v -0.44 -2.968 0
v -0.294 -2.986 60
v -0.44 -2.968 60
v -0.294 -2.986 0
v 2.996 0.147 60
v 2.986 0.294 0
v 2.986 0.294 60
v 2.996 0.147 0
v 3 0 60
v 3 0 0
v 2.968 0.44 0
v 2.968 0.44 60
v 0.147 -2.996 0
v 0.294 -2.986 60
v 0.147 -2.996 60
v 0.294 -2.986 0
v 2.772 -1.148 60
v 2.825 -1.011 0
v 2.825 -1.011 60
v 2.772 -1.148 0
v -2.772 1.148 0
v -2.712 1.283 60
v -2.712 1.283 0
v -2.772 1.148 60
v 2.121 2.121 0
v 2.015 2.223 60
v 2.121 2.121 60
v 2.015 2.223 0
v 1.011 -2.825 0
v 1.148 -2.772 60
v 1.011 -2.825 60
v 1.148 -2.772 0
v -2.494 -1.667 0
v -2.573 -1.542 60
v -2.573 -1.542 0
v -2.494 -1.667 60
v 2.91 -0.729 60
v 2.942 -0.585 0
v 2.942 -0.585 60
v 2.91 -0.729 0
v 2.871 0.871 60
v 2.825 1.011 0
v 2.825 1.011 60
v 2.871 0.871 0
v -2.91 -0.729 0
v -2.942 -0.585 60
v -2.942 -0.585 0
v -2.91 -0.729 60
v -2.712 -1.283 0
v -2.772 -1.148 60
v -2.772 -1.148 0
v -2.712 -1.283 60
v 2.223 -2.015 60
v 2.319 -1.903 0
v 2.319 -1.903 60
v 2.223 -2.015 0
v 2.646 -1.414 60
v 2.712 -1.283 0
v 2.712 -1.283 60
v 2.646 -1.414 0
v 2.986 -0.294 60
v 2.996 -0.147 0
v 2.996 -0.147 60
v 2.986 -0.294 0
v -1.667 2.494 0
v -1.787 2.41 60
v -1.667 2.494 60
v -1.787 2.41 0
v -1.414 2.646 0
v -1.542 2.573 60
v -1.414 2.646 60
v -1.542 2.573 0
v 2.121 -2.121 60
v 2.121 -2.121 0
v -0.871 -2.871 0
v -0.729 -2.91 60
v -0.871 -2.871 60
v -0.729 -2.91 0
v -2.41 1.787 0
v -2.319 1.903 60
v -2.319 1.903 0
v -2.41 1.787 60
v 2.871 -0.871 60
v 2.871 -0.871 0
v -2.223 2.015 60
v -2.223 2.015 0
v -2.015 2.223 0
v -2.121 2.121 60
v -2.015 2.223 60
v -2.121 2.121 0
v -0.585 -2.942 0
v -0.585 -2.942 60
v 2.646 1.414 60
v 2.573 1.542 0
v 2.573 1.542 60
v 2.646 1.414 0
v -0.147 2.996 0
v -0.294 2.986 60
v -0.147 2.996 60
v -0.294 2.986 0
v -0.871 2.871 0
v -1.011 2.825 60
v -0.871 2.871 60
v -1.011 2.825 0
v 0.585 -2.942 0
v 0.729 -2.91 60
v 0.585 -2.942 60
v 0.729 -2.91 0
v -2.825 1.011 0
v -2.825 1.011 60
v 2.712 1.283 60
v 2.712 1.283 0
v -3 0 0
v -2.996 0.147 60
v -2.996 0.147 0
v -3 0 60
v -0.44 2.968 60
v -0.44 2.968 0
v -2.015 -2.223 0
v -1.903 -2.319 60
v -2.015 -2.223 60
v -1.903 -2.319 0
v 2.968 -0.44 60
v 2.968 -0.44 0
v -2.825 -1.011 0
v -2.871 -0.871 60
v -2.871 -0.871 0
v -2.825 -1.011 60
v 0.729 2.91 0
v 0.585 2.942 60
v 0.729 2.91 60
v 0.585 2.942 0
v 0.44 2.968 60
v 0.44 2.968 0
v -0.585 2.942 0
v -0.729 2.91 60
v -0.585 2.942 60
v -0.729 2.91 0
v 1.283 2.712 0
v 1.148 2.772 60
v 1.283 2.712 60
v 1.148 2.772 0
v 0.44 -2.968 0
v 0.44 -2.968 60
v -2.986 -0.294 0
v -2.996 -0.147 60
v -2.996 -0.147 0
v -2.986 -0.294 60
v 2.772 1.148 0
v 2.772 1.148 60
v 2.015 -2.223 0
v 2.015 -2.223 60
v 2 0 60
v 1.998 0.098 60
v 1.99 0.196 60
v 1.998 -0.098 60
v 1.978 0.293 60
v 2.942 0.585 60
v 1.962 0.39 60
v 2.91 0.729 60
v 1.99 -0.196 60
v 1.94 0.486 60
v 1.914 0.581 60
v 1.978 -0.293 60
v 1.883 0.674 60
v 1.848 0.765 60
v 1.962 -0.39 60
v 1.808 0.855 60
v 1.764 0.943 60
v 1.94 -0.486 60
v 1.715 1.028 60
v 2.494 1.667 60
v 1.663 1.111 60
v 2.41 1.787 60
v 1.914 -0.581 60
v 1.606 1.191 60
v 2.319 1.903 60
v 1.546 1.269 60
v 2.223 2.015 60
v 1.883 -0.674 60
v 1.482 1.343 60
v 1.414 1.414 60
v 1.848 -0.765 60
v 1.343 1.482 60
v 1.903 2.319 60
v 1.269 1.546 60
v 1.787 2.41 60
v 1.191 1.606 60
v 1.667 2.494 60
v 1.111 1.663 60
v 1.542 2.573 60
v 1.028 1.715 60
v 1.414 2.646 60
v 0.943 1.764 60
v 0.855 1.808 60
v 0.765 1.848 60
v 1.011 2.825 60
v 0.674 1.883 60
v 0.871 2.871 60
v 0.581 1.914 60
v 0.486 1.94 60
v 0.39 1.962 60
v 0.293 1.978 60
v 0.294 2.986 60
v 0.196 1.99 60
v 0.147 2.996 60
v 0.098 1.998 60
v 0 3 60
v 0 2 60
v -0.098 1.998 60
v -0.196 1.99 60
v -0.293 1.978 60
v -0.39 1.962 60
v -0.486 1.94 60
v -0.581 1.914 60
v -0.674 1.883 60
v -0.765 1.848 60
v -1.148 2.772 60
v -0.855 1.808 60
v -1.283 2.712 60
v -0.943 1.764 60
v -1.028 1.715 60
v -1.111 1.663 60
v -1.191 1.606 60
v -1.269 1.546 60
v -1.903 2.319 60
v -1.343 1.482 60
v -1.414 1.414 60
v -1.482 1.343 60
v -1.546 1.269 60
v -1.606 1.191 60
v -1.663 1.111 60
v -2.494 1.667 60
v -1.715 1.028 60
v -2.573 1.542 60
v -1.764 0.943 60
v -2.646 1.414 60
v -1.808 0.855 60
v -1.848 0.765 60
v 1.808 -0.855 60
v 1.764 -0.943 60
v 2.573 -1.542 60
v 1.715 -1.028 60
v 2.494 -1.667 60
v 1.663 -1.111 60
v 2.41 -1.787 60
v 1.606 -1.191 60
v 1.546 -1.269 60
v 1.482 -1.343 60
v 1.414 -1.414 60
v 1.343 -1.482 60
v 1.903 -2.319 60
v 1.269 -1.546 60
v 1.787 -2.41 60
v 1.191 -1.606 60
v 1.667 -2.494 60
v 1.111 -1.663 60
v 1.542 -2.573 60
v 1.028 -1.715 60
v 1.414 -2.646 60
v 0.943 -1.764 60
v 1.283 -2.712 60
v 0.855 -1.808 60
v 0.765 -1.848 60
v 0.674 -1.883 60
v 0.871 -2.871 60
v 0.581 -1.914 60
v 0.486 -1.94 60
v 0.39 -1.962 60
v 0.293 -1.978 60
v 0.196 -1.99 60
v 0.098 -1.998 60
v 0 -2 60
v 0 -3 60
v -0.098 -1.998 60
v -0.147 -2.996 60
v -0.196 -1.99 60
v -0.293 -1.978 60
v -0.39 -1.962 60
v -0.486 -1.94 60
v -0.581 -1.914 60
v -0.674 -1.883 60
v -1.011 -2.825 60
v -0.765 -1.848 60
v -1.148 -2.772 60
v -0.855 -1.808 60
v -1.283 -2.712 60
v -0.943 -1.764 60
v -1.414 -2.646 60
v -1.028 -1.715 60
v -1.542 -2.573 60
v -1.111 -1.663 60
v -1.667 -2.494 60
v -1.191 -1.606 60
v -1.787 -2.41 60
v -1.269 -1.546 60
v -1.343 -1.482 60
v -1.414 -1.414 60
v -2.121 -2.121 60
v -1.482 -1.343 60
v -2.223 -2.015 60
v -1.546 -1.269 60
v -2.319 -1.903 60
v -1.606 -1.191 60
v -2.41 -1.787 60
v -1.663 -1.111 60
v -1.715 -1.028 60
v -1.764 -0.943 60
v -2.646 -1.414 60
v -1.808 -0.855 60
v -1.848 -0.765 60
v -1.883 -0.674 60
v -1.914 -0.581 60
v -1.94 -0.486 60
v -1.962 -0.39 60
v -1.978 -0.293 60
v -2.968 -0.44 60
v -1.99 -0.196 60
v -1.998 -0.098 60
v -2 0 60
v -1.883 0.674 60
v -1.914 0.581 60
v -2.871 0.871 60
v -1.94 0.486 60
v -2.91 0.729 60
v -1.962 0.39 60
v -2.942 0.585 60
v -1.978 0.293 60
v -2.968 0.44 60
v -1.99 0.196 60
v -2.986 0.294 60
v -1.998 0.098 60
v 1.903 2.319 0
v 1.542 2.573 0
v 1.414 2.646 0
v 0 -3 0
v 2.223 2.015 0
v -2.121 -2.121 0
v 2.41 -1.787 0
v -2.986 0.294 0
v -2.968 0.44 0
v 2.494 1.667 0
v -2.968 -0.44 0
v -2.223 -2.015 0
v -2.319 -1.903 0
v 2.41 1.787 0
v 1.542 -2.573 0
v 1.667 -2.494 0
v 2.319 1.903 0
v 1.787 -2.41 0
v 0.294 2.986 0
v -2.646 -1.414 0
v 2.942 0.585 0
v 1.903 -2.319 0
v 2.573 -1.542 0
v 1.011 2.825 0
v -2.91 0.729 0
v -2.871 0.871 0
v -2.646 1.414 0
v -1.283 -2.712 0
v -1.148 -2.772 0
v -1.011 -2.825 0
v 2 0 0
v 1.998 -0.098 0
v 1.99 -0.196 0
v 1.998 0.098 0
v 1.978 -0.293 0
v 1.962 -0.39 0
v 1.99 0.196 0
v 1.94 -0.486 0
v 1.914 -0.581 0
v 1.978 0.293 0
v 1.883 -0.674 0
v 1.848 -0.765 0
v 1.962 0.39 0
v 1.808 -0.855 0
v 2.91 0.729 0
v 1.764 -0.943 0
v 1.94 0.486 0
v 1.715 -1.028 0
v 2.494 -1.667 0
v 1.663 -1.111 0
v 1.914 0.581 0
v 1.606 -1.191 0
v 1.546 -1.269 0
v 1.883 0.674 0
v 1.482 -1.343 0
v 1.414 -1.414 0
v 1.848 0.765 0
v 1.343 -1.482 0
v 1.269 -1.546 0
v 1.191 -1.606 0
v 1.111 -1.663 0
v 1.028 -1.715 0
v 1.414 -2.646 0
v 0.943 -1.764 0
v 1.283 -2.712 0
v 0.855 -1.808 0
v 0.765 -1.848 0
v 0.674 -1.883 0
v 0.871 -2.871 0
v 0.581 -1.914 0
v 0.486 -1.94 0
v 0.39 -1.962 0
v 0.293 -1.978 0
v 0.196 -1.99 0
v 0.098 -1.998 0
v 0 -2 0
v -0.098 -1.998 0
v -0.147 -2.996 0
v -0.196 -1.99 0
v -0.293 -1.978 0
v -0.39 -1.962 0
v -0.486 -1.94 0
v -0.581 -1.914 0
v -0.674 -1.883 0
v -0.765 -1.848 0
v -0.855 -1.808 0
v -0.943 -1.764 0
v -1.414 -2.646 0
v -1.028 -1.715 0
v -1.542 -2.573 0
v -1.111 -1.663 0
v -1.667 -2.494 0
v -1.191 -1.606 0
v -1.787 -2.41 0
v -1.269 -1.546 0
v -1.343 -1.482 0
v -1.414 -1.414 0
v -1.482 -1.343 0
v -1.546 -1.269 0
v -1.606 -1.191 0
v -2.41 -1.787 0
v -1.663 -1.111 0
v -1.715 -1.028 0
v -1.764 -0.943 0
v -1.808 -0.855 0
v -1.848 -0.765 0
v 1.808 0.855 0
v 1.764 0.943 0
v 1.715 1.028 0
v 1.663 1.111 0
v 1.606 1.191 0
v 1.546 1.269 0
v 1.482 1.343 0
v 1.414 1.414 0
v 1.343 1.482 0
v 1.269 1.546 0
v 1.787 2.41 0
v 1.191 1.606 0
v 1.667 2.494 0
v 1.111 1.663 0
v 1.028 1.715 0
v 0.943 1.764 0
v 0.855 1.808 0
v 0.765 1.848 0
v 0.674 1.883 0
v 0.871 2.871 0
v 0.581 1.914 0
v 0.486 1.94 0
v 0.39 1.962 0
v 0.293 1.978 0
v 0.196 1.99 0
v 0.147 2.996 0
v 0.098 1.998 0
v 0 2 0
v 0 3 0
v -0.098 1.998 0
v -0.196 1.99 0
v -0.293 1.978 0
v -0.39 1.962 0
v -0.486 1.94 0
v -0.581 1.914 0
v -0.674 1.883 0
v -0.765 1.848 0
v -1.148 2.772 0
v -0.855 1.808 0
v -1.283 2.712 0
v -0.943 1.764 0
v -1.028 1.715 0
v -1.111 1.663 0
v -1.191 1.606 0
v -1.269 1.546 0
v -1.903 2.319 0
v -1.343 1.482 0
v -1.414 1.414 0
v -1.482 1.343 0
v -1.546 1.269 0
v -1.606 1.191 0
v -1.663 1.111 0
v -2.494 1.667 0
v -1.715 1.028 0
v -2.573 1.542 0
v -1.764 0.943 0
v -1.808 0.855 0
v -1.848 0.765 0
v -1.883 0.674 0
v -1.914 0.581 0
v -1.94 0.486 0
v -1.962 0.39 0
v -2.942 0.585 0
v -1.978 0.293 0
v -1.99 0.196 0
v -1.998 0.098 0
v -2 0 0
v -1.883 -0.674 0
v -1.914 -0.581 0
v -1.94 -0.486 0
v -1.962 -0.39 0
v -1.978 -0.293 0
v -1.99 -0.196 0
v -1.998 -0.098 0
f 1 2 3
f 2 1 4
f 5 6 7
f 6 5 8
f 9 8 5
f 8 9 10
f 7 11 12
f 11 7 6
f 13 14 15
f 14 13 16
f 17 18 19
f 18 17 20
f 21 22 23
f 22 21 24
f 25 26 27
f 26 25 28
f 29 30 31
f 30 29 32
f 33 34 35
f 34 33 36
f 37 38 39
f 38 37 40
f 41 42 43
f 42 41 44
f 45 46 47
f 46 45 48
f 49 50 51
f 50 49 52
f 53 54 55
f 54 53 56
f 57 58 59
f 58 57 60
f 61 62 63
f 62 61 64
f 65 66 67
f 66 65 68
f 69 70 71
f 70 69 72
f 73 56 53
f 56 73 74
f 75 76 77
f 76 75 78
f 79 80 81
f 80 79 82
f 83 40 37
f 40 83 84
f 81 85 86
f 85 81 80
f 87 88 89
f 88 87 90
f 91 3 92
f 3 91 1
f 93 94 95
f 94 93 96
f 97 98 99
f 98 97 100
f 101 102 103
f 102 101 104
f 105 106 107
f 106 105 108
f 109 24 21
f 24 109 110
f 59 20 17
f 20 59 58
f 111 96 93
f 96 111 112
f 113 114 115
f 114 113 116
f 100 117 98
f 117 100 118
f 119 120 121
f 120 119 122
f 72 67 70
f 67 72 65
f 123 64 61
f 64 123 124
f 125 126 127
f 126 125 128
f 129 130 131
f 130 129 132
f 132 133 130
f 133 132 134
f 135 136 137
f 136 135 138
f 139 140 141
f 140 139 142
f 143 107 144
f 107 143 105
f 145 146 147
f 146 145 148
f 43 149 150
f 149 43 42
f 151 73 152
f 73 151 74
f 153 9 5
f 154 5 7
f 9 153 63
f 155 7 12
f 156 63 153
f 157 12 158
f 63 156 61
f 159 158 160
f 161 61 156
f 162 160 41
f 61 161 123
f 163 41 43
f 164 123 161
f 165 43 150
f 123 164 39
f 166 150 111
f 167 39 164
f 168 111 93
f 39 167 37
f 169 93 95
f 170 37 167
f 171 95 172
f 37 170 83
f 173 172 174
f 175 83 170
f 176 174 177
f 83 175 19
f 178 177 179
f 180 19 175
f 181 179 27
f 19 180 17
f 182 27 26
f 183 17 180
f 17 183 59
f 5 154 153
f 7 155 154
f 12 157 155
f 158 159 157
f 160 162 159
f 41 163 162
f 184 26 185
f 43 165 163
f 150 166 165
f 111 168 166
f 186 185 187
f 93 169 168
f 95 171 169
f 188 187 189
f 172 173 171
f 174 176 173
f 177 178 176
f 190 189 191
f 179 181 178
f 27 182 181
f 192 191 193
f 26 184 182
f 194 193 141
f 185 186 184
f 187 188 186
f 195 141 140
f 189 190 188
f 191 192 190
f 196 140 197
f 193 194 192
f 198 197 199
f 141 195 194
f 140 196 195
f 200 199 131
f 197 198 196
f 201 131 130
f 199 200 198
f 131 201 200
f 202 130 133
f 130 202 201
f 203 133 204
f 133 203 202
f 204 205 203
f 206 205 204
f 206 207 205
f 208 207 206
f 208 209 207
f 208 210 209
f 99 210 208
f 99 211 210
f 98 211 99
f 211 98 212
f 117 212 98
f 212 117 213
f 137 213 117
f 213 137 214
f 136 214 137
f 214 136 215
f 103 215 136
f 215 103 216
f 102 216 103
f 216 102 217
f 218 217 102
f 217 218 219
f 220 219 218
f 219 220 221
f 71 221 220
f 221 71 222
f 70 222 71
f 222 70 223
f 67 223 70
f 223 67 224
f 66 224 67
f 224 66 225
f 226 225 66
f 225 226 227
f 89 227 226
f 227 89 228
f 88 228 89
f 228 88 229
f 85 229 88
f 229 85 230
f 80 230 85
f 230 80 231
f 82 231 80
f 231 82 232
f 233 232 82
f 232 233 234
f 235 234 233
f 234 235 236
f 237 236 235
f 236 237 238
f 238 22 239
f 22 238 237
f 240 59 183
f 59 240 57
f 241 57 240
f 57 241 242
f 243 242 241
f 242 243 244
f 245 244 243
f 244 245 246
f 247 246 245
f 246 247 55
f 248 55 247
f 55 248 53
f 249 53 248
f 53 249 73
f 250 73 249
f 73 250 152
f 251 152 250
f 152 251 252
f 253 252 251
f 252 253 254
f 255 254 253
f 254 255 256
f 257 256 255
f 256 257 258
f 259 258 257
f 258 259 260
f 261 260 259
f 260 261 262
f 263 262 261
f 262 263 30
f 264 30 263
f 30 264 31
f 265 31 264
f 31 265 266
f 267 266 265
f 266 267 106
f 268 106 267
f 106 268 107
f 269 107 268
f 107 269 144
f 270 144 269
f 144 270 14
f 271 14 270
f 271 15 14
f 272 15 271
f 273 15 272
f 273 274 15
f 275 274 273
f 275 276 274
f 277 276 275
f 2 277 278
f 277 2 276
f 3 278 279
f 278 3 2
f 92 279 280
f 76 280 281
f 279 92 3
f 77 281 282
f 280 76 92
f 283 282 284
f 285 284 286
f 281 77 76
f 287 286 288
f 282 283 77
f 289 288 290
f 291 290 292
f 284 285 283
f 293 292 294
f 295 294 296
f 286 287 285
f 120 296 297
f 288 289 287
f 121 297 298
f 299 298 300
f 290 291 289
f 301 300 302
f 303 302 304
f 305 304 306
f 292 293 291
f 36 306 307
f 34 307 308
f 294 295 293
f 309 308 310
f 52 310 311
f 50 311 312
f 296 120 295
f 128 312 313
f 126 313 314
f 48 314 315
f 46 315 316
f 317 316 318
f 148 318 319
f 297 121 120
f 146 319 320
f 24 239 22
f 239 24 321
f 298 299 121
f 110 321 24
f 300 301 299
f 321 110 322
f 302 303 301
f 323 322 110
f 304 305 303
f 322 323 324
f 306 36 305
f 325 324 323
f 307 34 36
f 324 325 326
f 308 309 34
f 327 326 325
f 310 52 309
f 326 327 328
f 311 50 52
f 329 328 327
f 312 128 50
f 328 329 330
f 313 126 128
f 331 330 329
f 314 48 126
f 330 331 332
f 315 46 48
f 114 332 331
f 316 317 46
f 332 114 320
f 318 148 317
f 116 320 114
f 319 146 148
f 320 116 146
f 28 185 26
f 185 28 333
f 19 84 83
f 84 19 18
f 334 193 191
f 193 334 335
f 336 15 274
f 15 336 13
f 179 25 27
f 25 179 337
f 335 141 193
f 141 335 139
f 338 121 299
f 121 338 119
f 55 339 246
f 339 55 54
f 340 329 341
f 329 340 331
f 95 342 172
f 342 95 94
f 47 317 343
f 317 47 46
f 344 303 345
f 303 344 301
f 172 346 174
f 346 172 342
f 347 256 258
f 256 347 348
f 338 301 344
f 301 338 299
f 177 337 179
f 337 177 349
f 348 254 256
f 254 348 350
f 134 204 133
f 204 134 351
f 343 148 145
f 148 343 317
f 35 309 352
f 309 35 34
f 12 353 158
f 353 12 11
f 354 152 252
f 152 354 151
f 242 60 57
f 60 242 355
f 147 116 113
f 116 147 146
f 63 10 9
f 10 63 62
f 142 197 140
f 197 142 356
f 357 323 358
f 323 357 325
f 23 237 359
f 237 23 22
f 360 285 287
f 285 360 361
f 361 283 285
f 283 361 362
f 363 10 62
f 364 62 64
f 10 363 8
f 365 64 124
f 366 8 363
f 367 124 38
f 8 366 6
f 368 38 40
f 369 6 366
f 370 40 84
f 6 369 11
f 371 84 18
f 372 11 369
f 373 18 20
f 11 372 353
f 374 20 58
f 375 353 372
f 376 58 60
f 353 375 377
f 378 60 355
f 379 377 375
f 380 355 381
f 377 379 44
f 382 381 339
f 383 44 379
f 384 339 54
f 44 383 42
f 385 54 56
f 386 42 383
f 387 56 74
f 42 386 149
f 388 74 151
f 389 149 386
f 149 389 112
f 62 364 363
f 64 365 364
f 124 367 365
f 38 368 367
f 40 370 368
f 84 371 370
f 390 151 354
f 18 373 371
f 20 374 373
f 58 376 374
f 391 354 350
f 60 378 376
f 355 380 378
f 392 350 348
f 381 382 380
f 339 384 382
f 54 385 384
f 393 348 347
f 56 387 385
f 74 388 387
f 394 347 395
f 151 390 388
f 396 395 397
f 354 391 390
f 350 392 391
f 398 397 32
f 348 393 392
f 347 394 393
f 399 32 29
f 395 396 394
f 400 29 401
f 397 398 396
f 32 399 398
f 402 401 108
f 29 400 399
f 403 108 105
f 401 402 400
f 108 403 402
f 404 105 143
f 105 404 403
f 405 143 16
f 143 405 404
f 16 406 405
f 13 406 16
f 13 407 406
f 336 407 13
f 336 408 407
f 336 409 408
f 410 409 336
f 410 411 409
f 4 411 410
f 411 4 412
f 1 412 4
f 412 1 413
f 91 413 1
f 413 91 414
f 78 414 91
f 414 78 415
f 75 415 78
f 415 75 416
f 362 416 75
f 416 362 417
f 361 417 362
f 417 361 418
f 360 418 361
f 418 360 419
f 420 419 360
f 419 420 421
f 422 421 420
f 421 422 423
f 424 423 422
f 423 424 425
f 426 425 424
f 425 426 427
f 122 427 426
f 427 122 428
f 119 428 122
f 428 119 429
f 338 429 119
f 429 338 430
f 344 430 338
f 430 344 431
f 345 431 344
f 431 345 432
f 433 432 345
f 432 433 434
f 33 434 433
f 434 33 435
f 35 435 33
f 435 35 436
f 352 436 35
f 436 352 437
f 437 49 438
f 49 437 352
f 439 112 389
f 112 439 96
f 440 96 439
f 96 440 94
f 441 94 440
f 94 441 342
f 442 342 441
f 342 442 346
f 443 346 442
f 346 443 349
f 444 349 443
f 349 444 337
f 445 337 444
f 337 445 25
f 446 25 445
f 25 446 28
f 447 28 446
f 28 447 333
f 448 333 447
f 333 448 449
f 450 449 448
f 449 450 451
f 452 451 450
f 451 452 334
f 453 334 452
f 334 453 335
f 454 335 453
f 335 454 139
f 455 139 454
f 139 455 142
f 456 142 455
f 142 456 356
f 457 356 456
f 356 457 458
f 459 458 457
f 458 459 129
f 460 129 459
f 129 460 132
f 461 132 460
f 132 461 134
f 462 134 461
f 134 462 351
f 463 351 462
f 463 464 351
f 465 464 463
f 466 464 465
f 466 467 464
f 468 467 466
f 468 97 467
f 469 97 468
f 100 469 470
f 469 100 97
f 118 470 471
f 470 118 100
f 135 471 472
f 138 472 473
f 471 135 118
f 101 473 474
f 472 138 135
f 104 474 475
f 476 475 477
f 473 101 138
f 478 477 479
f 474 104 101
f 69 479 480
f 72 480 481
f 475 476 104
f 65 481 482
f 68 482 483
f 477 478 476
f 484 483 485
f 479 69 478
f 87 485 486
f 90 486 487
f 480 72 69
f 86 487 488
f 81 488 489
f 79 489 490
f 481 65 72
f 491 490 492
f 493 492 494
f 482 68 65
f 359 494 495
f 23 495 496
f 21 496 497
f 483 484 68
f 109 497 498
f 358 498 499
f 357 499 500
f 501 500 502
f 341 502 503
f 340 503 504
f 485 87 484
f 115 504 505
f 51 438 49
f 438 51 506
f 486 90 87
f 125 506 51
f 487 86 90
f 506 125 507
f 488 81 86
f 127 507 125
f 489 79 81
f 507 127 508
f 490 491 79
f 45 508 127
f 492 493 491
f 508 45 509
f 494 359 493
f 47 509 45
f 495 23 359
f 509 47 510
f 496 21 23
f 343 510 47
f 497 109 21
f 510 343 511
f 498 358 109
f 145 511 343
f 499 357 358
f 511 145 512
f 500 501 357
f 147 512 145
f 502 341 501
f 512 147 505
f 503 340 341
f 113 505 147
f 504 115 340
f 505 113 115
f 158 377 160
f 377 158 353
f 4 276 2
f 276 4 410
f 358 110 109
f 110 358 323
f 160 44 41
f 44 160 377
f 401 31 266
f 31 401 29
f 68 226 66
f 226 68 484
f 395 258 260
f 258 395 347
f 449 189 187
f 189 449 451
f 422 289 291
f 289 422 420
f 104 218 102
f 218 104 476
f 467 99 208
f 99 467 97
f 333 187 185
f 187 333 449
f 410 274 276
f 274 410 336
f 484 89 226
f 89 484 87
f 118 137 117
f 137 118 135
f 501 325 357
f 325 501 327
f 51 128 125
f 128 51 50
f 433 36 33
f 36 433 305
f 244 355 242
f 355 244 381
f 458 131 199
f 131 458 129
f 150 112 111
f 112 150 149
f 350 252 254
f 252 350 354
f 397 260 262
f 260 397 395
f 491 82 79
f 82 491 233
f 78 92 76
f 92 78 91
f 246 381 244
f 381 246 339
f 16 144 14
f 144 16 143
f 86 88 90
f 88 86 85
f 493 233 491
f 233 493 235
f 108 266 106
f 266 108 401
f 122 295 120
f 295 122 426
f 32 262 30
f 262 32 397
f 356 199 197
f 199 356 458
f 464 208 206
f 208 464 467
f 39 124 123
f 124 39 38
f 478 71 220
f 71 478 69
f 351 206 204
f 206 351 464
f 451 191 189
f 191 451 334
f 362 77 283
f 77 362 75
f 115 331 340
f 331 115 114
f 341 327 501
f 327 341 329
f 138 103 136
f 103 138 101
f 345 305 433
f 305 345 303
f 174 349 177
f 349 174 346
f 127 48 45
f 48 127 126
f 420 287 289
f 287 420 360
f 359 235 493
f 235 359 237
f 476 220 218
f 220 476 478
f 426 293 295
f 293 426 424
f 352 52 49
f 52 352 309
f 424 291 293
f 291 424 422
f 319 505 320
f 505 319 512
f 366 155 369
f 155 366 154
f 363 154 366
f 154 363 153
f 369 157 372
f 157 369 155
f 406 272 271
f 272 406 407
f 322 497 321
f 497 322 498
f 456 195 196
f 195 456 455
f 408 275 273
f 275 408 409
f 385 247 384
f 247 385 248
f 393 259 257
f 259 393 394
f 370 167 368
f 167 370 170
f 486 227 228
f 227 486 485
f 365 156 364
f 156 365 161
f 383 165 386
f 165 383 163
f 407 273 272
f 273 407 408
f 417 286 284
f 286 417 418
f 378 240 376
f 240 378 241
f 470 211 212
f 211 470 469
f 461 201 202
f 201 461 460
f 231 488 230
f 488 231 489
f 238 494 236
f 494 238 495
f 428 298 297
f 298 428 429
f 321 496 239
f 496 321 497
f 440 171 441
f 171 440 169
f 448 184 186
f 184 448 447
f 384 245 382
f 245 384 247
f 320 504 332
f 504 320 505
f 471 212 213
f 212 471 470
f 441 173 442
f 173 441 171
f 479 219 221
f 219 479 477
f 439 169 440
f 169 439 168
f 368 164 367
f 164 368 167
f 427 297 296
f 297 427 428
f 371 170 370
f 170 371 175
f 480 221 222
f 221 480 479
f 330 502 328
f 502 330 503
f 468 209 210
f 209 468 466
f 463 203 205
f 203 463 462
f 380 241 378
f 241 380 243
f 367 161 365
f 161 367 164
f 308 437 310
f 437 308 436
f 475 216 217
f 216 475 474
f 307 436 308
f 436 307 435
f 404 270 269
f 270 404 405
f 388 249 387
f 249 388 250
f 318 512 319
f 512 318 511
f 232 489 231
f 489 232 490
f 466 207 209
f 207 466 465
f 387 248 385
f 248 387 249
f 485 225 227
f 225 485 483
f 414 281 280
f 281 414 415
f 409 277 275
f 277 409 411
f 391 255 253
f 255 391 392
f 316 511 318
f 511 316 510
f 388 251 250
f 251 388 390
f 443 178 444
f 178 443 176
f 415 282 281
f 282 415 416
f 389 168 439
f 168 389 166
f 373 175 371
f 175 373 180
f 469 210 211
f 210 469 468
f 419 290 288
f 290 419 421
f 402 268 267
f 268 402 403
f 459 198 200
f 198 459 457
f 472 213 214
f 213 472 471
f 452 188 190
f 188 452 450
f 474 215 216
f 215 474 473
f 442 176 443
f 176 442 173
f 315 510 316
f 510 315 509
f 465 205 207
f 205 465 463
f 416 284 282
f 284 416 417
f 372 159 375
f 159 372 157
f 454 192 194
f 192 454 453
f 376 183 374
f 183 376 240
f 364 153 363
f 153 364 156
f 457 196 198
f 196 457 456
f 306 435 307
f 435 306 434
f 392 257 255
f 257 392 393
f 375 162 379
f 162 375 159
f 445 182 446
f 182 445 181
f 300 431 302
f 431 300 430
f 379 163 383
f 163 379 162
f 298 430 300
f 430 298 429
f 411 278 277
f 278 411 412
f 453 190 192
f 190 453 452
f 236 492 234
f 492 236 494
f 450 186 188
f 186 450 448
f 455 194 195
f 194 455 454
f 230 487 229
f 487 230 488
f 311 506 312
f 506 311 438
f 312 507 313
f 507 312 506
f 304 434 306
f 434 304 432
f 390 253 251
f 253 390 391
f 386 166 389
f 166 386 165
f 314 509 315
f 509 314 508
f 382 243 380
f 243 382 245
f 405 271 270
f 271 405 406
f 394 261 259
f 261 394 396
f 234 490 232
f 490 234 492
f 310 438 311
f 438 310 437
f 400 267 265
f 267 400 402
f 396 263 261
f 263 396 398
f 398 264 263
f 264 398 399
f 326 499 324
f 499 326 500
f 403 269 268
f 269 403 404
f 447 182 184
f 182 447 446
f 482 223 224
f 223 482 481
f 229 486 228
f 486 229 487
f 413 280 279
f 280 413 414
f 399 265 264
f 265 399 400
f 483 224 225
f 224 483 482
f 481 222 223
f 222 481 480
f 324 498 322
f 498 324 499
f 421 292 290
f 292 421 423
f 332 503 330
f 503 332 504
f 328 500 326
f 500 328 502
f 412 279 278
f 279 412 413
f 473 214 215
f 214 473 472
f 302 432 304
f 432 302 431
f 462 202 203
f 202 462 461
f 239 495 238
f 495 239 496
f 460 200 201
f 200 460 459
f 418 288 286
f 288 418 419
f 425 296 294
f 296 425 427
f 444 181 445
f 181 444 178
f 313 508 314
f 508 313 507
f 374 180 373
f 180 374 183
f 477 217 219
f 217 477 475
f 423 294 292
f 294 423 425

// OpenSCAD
$fn = 128;

// PTFE sleeving (tubing) parameters (mm)
length = 60;
outer_d = 6;
inner_d = 4;

// Simple hollow cylinder (tube)
difference() {
  cylinder(h = length, d = outer_d, center = false);
  translate([0, 0, -0.2])
    cylinder(h = length + 0.4, d = inner_d, center = false);
}
